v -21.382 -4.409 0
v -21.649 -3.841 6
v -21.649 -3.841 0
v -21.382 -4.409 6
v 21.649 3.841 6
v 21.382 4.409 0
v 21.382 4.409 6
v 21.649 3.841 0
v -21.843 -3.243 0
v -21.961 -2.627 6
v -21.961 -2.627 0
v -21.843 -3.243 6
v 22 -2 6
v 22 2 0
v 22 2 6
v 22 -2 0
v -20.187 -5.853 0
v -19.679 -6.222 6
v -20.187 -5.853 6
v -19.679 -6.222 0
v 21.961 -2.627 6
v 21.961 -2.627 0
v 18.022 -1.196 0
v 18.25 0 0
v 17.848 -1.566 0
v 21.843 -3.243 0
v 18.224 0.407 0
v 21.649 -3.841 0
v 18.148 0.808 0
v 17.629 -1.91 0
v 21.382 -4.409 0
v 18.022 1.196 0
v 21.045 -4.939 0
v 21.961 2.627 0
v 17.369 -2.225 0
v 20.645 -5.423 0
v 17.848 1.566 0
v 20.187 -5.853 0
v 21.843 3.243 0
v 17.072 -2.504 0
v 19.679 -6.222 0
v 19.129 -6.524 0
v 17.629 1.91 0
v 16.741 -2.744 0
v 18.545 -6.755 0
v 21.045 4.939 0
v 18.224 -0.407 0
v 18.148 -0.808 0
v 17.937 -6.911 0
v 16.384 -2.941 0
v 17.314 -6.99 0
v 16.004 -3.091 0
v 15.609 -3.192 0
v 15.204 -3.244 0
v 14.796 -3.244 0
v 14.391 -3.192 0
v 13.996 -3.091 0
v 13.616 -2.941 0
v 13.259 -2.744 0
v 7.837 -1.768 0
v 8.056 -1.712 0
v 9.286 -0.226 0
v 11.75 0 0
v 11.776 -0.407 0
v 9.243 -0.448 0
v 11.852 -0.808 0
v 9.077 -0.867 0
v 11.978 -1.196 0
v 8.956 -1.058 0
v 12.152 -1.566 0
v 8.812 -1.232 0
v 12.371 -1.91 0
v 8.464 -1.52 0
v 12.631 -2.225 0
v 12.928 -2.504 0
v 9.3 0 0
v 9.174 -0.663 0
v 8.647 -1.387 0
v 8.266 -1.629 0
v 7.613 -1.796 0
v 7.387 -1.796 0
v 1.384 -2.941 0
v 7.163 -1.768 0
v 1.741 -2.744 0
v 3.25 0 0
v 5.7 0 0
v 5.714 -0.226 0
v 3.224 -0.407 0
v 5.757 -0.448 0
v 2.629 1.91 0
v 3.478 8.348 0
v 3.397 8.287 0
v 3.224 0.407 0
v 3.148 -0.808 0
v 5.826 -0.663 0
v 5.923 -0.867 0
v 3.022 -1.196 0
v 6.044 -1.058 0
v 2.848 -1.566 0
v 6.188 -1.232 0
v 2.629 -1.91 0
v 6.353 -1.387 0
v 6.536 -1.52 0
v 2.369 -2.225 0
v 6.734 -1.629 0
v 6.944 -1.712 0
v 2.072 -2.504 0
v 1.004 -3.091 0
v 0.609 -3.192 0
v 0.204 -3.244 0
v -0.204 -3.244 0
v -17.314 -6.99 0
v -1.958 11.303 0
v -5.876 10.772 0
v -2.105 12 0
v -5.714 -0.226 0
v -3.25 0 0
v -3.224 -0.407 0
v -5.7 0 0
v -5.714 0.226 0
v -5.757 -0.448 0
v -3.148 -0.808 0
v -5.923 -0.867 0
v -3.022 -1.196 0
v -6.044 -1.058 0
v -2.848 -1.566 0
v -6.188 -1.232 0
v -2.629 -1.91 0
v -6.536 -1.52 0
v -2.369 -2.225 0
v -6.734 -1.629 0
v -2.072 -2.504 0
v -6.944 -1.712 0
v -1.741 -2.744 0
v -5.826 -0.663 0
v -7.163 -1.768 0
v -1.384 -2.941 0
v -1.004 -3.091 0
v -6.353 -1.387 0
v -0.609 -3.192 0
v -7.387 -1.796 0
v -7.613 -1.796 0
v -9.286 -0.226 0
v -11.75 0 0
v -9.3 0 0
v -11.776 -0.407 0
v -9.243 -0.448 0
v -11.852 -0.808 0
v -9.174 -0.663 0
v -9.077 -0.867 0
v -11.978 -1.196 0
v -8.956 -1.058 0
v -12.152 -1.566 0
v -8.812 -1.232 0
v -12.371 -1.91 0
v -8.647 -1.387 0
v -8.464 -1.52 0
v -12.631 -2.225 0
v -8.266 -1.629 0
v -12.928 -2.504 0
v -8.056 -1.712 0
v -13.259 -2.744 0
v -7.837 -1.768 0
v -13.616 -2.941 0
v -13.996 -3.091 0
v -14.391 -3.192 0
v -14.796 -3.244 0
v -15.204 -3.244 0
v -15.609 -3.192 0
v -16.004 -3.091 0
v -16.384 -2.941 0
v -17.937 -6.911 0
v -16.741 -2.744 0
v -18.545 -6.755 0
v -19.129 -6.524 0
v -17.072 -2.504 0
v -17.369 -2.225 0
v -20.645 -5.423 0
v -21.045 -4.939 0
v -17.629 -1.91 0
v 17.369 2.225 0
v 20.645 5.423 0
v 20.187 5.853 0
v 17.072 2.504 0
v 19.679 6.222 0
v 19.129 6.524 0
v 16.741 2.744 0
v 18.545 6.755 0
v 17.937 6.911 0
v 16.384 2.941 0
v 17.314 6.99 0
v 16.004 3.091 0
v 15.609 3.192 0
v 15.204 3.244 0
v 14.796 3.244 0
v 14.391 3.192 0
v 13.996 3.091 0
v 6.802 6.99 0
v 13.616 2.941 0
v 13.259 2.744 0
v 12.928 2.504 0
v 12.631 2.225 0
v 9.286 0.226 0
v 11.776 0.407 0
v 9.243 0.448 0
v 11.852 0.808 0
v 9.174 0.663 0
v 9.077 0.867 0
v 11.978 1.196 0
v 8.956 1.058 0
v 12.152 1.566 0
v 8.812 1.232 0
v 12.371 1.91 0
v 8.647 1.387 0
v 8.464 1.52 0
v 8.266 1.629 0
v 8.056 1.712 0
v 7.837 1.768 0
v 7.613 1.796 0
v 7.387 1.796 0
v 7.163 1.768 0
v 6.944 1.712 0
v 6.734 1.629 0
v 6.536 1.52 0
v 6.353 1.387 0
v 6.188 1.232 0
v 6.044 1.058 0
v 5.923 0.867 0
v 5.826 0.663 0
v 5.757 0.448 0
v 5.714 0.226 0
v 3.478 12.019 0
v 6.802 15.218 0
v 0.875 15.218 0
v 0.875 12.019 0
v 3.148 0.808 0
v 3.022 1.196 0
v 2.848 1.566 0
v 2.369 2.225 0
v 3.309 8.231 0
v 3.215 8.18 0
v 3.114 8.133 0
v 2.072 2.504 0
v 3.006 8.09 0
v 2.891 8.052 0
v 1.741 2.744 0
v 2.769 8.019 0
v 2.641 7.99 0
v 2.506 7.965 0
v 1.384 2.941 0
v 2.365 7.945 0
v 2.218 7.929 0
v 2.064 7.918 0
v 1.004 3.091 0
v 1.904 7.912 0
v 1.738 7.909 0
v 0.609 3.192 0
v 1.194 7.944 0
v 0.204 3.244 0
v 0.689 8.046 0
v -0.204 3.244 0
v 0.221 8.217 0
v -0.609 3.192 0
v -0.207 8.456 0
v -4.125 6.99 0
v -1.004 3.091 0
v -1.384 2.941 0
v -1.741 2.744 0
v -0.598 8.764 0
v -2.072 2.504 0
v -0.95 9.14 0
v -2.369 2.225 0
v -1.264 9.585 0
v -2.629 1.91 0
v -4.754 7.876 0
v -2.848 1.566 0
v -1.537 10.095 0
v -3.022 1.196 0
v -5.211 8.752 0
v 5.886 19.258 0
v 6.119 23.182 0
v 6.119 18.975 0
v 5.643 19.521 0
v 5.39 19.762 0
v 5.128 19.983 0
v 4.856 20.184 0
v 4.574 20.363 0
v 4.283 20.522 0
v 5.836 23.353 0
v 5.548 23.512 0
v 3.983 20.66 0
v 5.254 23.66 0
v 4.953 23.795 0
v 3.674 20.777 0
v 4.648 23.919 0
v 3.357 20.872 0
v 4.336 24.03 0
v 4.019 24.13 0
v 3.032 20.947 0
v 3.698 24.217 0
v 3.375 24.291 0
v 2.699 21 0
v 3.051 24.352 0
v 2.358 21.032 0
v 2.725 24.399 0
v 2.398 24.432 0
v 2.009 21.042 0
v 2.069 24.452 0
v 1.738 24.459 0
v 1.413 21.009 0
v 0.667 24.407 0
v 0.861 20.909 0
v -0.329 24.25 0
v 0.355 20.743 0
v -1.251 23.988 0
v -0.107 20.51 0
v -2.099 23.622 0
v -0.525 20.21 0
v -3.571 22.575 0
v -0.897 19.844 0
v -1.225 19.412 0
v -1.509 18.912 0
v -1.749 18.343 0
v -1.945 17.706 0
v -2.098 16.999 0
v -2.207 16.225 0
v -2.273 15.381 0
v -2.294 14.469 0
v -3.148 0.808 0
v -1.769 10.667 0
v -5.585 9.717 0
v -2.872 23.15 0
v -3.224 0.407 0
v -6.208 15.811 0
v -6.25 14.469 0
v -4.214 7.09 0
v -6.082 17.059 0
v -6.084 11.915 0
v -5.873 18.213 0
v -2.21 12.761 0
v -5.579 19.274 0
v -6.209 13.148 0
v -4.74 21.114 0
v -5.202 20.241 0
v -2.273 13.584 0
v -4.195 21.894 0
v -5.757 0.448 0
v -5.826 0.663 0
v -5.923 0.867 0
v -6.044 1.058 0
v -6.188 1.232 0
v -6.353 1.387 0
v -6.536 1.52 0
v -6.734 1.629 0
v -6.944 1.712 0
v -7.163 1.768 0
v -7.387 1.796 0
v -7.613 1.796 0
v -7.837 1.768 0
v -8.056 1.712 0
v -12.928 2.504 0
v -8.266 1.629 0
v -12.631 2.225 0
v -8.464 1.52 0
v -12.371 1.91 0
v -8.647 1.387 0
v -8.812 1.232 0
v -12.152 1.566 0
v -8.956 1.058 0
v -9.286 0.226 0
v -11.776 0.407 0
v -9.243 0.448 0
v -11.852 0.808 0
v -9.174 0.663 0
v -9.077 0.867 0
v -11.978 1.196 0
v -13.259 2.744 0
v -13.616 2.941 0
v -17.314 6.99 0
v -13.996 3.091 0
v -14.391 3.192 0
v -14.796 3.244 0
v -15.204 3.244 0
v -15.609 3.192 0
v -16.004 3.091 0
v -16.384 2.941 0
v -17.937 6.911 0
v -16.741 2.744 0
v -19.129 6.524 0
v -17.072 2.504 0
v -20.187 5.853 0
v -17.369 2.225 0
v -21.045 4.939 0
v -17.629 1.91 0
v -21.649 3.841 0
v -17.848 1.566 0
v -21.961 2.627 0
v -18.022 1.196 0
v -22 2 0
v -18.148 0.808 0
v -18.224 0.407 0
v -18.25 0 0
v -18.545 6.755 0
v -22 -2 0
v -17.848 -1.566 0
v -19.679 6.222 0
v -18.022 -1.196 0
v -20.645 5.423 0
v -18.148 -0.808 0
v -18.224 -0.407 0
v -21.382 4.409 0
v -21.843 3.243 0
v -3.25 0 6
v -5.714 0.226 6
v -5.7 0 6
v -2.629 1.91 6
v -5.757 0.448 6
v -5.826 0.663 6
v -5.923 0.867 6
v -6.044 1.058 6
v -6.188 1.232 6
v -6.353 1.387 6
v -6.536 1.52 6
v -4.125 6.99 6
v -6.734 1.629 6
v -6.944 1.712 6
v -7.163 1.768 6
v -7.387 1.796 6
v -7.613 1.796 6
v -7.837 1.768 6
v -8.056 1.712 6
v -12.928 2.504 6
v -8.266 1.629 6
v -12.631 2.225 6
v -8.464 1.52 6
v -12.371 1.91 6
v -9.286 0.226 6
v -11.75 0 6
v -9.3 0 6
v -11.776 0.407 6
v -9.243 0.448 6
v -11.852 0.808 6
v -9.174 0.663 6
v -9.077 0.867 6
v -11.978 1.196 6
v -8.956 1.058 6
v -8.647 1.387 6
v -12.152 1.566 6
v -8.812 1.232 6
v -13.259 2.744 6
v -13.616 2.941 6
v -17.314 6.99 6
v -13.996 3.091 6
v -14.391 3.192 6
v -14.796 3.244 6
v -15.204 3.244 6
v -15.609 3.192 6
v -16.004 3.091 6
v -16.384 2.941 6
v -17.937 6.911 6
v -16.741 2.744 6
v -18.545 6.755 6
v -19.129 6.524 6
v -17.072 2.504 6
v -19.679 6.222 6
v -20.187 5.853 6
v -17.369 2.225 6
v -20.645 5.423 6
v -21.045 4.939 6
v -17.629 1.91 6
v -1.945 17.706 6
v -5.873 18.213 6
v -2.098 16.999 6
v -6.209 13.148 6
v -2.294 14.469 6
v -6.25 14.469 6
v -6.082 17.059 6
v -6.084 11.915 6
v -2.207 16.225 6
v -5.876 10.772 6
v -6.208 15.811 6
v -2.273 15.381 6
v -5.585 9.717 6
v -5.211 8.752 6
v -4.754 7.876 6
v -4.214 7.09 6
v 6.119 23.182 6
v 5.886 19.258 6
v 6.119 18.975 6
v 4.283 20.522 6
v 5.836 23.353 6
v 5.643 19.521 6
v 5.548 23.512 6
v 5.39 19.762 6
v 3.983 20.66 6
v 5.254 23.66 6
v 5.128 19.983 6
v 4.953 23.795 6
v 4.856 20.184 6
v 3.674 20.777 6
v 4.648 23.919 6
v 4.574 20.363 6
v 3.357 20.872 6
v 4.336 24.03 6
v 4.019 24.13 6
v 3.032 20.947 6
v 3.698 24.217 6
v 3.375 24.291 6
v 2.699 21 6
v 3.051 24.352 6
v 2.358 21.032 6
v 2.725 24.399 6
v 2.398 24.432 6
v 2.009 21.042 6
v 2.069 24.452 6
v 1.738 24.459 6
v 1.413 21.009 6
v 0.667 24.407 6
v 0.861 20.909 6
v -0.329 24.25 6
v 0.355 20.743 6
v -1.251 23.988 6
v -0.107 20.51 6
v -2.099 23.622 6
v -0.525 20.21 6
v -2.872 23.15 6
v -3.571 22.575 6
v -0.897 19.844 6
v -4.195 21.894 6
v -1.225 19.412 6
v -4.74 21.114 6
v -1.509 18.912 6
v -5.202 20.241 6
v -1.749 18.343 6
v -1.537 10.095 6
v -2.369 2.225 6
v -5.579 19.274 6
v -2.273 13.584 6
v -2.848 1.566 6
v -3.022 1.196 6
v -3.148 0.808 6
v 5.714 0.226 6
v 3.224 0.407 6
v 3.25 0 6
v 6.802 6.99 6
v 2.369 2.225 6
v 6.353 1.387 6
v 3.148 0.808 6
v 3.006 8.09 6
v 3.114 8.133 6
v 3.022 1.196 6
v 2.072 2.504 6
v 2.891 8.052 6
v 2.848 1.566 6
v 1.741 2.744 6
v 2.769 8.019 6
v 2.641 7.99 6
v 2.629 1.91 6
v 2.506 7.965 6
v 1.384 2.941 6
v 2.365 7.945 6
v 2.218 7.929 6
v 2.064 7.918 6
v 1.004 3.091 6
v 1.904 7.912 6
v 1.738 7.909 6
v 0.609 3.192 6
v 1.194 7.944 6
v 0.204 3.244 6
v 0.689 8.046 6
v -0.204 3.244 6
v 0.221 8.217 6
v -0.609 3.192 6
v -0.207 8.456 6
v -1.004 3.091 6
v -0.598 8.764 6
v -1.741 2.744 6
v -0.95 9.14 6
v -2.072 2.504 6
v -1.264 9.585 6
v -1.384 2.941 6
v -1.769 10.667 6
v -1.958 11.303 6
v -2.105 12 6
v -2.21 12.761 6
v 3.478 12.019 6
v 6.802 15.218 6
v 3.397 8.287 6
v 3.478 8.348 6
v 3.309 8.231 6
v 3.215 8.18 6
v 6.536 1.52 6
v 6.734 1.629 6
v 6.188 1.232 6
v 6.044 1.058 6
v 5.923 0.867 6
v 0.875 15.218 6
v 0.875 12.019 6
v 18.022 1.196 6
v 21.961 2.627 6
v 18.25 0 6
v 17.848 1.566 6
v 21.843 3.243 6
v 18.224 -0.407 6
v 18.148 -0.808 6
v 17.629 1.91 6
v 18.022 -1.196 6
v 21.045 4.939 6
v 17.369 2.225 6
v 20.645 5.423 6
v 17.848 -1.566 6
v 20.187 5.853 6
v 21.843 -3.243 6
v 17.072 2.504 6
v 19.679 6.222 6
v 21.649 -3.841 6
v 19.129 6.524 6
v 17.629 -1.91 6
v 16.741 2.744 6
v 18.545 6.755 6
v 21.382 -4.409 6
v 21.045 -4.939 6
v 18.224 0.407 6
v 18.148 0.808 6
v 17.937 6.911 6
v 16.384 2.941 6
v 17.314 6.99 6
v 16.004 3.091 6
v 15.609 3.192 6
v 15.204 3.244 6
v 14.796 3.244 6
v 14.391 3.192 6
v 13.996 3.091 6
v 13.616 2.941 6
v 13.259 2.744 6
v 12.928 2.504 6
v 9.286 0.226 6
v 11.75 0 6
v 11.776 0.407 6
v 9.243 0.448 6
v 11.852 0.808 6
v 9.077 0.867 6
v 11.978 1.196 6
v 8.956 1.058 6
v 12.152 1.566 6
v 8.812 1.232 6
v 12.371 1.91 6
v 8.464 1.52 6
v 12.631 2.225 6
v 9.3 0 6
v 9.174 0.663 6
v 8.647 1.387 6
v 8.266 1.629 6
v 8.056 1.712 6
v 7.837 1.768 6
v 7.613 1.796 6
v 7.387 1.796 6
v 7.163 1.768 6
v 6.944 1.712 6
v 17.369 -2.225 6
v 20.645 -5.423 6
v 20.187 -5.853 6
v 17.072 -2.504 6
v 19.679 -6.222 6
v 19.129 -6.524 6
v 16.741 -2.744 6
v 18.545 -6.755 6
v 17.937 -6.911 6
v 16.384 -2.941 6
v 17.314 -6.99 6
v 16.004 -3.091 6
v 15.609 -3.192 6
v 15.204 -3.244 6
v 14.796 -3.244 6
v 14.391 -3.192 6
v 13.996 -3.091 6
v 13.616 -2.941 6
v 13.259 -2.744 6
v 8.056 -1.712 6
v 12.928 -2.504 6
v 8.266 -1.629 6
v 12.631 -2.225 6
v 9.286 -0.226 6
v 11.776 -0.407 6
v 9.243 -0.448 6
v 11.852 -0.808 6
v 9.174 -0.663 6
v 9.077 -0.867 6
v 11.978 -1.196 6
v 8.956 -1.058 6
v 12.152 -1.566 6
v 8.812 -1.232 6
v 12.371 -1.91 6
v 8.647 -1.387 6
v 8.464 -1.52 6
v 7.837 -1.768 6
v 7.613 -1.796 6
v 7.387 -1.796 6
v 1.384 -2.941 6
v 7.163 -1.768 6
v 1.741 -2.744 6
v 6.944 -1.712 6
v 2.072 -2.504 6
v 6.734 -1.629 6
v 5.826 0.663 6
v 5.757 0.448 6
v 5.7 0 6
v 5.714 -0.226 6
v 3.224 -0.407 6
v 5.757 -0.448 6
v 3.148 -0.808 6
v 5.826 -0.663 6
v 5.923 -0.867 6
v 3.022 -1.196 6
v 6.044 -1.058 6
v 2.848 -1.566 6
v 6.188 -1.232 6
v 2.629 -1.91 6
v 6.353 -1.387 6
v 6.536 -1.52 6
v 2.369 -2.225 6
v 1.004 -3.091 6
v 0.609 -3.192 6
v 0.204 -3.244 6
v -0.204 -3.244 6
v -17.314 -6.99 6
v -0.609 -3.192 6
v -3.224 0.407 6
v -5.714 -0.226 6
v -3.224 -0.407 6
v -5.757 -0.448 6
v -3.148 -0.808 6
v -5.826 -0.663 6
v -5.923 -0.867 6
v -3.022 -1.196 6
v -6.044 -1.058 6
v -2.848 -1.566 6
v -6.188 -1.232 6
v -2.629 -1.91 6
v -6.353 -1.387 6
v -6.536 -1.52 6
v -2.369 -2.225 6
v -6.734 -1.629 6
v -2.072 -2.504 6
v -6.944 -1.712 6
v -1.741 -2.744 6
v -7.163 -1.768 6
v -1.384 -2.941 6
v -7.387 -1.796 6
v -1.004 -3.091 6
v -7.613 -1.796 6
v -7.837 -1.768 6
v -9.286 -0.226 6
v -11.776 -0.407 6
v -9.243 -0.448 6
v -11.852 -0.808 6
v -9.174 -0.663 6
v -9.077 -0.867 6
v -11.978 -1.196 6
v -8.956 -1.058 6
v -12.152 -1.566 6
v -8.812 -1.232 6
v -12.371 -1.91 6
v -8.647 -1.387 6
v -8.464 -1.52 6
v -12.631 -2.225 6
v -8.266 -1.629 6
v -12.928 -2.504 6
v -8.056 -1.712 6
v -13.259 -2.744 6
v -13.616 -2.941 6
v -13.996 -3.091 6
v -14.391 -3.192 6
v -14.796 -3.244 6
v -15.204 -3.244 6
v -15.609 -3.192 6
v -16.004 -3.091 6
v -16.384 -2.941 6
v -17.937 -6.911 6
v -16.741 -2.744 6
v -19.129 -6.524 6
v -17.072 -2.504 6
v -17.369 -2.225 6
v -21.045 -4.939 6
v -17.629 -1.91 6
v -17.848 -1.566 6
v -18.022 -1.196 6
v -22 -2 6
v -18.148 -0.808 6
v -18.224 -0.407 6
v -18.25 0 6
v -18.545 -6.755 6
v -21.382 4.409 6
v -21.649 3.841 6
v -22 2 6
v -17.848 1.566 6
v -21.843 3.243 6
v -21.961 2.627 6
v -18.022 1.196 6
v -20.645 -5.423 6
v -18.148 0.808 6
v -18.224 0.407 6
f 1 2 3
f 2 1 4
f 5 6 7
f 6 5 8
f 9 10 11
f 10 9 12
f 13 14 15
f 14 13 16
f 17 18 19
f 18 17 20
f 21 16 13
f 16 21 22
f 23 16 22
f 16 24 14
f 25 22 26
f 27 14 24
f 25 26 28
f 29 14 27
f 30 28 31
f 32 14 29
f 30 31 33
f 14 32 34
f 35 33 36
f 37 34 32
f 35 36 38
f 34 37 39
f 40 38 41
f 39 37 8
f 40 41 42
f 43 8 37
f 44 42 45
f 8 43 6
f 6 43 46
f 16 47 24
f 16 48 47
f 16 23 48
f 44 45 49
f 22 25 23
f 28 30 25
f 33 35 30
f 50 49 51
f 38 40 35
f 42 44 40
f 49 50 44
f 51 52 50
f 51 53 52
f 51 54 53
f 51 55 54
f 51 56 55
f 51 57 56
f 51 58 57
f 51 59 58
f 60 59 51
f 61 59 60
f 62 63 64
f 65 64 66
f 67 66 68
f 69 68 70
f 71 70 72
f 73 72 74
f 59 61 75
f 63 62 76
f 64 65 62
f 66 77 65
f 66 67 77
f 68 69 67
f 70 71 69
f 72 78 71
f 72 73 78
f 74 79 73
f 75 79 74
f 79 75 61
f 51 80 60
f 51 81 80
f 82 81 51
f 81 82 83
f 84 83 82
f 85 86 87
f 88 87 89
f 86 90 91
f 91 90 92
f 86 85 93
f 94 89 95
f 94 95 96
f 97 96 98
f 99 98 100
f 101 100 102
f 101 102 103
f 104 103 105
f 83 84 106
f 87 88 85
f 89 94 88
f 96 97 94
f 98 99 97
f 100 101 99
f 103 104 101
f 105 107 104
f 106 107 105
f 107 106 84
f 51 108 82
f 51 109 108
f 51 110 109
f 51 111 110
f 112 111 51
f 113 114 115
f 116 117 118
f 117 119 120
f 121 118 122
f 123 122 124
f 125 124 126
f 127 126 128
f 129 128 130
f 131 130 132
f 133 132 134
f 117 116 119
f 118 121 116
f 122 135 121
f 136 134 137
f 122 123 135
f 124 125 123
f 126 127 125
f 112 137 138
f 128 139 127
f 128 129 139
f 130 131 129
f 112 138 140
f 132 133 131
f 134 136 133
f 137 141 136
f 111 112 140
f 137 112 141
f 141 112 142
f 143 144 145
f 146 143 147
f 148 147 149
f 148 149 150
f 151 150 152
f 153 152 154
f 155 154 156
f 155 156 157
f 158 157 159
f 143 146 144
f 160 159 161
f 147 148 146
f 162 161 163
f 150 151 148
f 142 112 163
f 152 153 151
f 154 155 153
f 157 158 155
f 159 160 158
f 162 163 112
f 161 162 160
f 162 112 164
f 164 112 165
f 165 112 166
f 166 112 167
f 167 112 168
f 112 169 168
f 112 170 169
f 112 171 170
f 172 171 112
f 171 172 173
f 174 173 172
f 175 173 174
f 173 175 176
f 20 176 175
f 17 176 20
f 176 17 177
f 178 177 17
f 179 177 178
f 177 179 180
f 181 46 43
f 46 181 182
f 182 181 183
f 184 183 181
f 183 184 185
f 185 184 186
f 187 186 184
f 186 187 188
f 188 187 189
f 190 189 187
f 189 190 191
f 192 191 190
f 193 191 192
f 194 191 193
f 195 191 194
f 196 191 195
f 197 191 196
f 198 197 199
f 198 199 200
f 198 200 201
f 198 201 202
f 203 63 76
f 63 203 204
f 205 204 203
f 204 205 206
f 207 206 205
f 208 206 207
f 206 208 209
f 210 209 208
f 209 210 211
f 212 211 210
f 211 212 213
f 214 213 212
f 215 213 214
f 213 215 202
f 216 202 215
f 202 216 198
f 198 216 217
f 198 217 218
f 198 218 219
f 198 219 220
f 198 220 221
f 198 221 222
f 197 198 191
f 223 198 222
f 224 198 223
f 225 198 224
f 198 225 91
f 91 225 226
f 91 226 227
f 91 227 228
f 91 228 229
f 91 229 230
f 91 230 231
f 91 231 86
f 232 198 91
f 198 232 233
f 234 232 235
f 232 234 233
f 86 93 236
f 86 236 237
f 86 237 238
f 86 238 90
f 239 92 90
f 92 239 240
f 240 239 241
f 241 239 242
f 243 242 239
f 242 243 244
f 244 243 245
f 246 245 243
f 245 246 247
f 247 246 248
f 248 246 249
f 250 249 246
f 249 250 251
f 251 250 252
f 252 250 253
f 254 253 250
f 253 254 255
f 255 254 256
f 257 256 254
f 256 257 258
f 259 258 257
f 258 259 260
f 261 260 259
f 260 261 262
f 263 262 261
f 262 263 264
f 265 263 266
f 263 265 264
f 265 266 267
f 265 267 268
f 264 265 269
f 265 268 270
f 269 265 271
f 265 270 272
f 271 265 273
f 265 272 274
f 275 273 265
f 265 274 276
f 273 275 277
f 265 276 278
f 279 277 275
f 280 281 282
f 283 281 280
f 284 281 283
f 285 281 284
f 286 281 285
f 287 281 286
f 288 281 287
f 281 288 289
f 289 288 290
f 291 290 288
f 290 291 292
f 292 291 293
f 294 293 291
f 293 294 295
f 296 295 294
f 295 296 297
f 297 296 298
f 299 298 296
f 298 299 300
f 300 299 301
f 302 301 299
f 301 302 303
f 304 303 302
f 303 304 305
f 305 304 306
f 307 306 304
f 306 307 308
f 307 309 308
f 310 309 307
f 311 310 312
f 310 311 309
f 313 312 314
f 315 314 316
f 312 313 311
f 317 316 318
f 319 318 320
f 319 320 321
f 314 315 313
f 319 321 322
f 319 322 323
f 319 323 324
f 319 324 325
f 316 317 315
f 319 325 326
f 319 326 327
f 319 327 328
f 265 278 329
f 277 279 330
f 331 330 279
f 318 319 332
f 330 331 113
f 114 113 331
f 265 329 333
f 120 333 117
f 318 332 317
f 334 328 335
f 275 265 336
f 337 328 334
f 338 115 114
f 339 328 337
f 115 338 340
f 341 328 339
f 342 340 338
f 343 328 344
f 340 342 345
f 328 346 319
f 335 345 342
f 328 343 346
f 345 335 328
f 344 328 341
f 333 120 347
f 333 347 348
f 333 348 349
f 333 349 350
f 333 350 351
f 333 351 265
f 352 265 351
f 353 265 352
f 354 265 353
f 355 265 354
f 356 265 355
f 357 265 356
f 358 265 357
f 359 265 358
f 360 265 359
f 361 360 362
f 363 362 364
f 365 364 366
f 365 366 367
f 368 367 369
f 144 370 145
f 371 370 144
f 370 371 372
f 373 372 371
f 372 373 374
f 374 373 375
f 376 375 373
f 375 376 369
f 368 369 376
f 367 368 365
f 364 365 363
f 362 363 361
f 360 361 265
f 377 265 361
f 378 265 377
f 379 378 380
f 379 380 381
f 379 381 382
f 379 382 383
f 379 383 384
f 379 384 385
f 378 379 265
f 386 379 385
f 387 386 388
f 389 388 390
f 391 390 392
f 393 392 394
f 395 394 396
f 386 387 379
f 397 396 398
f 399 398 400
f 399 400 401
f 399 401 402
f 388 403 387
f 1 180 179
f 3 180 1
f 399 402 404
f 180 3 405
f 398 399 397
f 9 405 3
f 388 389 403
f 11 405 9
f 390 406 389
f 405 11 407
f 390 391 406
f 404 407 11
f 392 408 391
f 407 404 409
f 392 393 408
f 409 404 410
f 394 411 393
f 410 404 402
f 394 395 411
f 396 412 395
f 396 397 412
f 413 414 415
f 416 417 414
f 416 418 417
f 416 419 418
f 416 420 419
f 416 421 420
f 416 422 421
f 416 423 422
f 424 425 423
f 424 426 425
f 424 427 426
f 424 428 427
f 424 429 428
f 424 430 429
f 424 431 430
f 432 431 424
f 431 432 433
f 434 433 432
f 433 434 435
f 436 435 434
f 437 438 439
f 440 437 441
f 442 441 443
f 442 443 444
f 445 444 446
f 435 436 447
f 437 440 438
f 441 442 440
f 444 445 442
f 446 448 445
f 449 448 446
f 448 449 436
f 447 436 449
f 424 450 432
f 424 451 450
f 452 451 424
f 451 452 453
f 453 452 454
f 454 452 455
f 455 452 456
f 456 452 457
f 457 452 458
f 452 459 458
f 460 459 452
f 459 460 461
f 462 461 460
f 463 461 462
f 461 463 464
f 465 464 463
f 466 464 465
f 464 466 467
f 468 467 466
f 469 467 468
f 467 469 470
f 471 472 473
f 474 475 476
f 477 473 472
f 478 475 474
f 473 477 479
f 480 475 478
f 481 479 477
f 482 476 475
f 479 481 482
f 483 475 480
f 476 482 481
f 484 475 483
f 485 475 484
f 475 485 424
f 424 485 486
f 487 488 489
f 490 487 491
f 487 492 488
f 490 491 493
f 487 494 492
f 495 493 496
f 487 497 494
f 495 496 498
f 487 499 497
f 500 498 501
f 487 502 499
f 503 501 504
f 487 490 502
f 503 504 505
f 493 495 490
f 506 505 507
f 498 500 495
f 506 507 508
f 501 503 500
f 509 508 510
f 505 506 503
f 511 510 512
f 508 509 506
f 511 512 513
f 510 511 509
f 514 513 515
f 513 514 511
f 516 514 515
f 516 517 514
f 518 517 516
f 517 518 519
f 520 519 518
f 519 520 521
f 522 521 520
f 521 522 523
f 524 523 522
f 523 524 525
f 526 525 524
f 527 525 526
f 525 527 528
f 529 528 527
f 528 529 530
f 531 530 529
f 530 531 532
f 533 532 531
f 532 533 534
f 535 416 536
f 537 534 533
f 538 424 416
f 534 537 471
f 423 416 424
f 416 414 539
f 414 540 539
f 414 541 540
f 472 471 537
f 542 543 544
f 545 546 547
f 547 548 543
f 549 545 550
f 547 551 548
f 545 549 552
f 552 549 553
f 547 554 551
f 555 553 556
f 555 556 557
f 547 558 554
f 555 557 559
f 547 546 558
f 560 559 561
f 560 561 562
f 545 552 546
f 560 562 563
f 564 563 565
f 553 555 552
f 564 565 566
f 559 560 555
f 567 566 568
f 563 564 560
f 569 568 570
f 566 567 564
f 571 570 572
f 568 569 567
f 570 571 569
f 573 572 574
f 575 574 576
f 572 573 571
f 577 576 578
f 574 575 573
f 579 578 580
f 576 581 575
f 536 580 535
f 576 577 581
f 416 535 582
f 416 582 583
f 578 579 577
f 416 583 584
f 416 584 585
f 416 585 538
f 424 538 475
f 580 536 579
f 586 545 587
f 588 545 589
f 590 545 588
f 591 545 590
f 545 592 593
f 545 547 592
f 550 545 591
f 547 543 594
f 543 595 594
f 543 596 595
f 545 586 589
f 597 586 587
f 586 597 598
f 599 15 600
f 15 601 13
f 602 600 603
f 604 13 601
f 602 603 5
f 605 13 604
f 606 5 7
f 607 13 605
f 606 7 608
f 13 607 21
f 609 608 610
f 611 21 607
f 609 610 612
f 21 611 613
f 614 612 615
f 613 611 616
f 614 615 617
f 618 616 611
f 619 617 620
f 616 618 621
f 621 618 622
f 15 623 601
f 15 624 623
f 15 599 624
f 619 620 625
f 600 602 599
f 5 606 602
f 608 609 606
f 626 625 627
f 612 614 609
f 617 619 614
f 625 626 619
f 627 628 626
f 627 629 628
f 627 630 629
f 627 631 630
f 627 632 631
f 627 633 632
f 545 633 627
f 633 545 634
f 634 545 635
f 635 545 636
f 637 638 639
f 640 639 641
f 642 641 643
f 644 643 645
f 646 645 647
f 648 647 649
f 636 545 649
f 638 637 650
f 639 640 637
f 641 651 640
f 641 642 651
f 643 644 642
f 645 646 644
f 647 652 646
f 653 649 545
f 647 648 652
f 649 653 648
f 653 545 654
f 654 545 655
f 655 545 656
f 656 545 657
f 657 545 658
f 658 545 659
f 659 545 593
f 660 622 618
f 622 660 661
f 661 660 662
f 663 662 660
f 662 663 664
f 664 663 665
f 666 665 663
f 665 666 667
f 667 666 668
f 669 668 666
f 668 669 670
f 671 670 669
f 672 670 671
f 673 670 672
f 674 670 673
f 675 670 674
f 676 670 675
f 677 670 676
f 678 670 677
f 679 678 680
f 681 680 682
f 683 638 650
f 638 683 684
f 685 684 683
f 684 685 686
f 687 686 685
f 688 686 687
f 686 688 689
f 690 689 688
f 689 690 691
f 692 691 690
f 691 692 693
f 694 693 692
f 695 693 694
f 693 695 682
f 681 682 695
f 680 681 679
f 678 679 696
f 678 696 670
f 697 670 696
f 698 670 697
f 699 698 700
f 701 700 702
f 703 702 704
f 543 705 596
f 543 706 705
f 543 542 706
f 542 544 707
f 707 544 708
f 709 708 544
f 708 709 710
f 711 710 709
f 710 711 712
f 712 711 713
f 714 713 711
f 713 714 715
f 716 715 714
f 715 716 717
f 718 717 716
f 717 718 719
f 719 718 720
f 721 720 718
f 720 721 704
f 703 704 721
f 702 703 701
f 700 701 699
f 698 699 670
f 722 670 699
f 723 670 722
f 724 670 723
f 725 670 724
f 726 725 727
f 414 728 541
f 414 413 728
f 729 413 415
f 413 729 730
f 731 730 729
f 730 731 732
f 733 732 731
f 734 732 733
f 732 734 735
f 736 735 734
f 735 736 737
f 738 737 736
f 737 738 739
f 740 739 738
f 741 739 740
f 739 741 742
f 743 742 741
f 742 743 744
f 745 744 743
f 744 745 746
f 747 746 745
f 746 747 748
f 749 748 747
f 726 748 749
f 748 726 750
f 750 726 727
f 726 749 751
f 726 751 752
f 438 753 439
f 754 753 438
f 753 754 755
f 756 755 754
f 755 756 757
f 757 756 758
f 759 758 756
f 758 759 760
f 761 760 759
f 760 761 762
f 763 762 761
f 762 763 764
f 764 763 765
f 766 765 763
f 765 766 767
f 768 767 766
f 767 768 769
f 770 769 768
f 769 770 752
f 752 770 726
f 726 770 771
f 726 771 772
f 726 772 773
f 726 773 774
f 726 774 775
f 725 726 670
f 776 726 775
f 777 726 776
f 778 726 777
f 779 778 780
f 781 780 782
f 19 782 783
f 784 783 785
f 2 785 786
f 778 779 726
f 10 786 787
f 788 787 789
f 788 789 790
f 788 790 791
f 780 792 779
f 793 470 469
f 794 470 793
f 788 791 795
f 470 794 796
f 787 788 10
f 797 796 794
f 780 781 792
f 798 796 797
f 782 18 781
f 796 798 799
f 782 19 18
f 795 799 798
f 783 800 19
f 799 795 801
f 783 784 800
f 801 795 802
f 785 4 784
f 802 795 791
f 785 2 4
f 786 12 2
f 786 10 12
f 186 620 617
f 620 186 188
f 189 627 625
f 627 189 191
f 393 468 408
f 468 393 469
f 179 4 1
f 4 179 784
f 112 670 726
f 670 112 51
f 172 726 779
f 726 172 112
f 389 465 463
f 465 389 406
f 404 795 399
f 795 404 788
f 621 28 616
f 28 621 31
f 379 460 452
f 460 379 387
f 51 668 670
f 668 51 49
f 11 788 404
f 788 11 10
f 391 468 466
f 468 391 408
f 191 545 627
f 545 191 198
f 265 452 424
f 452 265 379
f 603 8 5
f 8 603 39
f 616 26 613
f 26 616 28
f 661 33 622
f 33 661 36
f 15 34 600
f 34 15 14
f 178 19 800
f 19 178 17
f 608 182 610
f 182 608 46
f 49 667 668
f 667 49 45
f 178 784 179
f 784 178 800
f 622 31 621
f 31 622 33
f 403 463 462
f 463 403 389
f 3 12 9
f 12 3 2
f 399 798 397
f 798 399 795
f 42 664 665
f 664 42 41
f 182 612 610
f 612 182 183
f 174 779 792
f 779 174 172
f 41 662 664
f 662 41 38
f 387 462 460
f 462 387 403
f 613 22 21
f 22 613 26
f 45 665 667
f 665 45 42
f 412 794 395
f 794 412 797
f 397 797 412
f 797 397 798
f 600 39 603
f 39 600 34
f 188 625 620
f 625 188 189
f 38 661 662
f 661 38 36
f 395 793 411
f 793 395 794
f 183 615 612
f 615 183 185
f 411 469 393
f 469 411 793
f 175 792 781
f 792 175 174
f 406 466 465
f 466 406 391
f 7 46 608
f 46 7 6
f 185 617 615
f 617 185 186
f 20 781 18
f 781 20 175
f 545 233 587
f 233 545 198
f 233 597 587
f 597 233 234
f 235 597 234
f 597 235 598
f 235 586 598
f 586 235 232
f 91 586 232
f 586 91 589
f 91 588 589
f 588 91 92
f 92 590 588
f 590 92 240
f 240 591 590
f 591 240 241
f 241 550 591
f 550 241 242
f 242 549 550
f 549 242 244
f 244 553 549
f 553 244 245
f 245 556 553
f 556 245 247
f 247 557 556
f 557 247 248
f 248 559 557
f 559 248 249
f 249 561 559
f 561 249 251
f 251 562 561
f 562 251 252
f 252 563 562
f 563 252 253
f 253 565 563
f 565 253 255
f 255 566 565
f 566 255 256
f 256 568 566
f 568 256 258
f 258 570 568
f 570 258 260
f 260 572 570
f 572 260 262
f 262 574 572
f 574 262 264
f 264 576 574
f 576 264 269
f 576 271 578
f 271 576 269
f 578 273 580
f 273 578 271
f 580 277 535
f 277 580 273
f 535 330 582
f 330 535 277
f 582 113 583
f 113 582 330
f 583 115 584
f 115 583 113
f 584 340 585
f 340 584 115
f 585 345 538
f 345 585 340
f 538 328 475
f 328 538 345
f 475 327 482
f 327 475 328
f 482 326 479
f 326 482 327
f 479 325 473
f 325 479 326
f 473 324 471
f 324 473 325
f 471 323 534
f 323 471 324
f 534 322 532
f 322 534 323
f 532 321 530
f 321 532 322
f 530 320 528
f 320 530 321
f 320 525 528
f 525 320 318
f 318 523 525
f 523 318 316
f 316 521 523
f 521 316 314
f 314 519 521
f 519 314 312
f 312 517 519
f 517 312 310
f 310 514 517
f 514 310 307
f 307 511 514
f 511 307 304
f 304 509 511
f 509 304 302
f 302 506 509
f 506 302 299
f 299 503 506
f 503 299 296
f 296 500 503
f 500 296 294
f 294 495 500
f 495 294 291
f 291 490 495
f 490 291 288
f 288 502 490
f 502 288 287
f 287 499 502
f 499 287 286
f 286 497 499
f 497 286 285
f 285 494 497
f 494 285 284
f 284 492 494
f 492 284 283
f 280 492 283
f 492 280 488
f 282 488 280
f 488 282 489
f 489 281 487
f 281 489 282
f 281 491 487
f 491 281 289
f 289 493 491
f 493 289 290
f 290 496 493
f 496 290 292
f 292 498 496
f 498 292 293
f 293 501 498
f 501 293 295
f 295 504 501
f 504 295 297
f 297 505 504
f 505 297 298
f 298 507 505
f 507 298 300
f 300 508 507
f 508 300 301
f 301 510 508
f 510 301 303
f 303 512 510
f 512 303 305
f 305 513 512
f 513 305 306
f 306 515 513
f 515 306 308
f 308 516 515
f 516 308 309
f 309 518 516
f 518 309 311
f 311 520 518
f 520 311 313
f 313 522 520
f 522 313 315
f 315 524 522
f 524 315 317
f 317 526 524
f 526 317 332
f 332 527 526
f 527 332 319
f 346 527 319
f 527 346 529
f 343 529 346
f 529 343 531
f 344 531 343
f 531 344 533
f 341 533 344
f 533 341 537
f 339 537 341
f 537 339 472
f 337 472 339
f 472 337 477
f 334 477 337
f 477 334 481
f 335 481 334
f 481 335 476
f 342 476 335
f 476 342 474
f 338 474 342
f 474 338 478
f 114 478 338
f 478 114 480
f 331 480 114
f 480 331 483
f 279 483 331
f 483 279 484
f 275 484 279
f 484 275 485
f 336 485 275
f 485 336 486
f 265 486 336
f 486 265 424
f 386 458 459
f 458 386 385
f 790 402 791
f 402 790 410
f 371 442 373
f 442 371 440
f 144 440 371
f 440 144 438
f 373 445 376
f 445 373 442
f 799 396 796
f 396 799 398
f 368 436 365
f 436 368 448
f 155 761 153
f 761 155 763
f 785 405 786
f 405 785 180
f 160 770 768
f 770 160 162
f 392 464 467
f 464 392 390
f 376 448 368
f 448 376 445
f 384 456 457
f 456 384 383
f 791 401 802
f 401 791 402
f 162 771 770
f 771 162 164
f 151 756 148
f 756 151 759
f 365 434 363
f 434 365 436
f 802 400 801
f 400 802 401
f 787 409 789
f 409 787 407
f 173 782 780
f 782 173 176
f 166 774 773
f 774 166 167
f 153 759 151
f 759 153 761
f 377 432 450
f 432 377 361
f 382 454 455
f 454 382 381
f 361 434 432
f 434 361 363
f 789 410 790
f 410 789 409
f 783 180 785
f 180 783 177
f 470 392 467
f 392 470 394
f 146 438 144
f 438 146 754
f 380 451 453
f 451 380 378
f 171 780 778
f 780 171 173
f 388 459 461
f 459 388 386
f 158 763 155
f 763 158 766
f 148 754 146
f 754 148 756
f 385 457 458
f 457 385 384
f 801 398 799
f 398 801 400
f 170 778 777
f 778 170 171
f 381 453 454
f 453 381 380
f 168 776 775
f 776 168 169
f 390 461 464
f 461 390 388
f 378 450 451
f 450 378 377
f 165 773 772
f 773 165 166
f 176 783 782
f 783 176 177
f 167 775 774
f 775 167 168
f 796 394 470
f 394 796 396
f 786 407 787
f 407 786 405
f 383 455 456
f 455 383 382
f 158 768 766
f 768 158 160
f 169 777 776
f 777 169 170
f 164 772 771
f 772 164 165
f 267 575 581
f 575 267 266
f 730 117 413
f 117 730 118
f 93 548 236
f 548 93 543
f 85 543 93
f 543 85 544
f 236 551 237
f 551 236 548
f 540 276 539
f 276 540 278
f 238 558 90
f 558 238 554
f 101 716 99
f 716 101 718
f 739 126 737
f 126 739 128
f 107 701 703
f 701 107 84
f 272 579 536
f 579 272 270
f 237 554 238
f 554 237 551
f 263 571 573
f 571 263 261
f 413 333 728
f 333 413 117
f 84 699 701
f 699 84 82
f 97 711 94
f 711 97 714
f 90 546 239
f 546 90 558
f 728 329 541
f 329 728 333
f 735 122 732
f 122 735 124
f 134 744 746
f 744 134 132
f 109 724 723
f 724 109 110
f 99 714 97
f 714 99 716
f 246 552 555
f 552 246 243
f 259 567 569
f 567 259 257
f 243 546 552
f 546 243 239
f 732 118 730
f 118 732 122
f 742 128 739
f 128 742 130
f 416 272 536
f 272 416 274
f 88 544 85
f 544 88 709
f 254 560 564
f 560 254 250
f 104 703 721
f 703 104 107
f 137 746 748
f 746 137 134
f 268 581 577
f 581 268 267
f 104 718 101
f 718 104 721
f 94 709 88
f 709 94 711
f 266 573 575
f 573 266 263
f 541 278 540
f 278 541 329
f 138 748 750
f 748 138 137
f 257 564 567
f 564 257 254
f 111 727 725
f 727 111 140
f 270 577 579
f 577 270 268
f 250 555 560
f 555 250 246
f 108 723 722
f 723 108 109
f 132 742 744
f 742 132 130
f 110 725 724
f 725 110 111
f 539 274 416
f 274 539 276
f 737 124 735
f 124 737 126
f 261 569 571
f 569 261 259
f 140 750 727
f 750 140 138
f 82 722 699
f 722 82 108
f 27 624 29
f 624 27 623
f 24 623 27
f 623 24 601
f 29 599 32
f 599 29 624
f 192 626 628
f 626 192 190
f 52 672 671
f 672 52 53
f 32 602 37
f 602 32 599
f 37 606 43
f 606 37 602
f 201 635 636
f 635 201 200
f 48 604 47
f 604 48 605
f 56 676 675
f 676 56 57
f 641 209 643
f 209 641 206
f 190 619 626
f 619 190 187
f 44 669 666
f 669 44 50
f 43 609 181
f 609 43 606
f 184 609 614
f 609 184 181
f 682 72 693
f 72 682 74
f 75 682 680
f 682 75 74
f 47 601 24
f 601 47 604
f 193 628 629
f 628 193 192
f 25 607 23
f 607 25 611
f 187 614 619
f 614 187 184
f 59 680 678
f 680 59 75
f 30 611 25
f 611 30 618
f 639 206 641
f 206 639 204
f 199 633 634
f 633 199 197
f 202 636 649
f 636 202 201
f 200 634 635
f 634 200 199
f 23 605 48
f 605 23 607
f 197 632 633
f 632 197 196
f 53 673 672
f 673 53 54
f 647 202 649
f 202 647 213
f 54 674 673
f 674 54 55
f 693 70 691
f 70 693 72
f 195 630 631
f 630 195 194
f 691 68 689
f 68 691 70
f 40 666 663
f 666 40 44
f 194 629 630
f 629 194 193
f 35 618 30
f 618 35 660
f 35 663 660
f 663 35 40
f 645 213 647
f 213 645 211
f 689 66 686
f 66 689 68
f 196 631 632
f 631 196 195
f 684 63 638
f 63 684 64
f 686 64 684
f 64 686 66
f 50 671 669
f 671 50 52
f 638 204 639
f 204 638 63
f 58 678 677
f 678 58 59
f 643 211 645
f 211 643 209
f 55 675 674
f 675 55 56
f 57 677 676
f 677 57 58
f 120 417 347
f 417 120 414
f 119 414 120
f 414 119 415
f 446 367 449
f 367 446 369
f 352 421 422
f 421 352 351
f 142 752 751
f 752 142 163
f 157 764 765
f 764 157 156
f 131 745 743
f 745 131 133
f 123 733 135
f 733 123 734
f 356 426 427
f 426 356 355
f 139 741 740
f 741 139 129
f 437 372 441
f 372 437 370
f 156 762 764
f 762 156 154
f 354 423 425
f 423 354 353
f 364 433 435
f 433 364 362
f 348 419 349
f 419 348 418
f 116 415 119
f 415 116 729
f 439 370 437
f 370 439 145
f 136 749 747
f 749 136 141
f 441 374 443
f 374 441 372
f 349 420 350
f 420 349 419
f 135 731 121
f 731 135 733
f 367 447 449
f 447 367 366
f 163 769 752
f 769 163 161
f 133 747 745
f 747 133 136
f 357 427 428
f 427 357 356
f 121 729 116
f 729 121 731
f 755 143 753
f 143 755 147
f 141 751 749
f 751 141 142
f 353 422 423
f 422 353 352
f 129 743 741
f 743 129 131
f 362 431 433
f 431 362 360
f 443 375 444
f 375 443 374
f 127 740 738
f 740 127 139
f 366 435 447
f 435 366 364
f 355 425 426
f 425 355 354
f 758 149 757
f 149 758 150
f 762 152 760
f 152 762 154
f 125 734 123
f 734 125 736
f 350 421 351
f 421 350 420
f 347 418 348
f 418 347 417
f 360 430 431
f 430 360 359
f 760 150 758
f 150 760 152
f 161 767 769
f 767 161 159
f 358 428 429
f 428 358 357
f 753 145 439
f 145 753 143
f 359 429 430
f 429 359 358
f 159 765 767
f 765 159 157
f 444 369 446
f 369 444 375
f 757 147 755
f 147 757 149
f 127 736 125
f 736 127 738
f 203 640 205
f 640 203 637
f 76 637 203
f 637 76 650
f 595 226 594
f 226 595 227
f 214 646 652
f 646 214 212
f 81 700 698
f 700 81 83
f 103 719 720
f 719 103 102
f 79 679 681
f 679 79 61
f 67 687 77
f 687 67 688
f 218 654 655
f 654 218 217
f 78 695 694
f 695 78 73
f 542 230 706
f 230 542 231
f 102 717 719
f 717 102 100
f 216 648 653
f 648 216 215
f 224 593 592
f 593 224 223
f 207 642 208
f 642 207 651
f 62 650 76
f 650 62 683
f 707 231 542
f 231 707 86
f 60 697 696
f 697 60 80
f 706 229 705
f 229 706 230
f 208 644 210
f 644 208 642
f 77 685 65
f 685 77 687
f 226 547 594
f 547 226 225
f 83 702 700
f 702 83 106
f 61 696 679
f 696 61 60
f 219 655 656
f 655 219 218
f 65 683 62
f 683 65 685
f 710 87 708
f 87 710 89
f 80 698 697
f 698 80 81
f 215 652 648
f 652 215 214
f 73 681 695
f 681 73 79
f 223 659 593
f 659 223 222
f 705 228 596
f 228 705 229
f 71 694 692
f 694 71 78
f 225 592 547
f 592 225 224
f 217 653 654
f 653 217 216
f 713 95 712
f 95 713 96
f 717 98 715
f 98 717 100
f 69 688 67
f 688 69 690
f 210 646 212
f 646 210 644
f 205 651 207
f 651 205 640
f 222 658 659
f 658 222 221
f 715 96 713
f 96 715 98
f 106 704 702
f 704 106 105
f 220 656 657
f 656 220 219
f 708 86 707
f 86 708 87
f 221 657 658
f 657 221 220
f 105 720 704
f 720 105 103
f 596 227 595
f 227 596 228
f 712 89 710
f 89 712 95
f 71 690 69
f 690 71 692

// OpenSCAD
$fn = 50;


difference() {
	union() {
		hull() {
			translate(v = [-17.0000000000, 2.0000000000, 0]) {
				cylinder(h = 6, r = 5);
			}
			translate(v = [17.0000000000, 2.0000000000, 0]) {
				cylinder(h = 6, r = 5);
			}
			translate(v = [-17.0000000000, -2.0000000000, 0]) {
				cylinder(h = 6, r = 5);
			}
			translate(v = [17.0000000000, -2.0000000000, 0]) {
				cylinder(h = 6, r = 5);
			}
		}
		translate(v = [0, 24, 0]) {
			linear_extrude(height = 6) {
				text(font = "DejaVu Sans Mono:style=Bold", halign = "center", size = 19.0000000000, text = "G", valign = "top");
			}
		}
	}
	union() {
		translate(v = [-15.0000000000, 0.0000000000, 0]) {
			translate(v = [0, 0, -100]) {
				cylinder(h = 200, r = 3.2500000000);
			}
		}
		translate(v = [0, 0, -100]) {
			cylinder(h = 200, r = 3.2500000000);
		}
		translate(v = [15.0000000000, 0.0000000000, 0]) {
			translate(v = [0, 0, -100]) {
				cylinder(h = 200, r = 3.2500000000);
			}
		}
		translate(v = [-15.0000000000, 0.0000000000, 0]) {
			translate(v = [0, 0, -100]) {
				cylinder(h = 200, r = 1.8000000000);
			}
		}
		translate(v = [-7.5000000000, 0.0000000000, 0]) {
			translate(v = [0, 0, -100]) {
				cylinder(h = 200, r = 1.8000000000);
			}
		}
		translate(v = [0, 0, -100]) {
			cylinder(h = 200, r = 1.8000000000);
		}
		translate(v = [7.5000000000, 0.0000000000, 0]) {
			translate(v = [0, 0, -100]) {
				cylinder(h = 200, r = 1.8000000000);
			}
		}
		translate(v = [15.0000000000, 0.0000000000, 0]) {
			translate(v = [0, 0, -100]) {
				cylinder(h = 200, r = 1.8000000000);
			}
		}
	}
}
